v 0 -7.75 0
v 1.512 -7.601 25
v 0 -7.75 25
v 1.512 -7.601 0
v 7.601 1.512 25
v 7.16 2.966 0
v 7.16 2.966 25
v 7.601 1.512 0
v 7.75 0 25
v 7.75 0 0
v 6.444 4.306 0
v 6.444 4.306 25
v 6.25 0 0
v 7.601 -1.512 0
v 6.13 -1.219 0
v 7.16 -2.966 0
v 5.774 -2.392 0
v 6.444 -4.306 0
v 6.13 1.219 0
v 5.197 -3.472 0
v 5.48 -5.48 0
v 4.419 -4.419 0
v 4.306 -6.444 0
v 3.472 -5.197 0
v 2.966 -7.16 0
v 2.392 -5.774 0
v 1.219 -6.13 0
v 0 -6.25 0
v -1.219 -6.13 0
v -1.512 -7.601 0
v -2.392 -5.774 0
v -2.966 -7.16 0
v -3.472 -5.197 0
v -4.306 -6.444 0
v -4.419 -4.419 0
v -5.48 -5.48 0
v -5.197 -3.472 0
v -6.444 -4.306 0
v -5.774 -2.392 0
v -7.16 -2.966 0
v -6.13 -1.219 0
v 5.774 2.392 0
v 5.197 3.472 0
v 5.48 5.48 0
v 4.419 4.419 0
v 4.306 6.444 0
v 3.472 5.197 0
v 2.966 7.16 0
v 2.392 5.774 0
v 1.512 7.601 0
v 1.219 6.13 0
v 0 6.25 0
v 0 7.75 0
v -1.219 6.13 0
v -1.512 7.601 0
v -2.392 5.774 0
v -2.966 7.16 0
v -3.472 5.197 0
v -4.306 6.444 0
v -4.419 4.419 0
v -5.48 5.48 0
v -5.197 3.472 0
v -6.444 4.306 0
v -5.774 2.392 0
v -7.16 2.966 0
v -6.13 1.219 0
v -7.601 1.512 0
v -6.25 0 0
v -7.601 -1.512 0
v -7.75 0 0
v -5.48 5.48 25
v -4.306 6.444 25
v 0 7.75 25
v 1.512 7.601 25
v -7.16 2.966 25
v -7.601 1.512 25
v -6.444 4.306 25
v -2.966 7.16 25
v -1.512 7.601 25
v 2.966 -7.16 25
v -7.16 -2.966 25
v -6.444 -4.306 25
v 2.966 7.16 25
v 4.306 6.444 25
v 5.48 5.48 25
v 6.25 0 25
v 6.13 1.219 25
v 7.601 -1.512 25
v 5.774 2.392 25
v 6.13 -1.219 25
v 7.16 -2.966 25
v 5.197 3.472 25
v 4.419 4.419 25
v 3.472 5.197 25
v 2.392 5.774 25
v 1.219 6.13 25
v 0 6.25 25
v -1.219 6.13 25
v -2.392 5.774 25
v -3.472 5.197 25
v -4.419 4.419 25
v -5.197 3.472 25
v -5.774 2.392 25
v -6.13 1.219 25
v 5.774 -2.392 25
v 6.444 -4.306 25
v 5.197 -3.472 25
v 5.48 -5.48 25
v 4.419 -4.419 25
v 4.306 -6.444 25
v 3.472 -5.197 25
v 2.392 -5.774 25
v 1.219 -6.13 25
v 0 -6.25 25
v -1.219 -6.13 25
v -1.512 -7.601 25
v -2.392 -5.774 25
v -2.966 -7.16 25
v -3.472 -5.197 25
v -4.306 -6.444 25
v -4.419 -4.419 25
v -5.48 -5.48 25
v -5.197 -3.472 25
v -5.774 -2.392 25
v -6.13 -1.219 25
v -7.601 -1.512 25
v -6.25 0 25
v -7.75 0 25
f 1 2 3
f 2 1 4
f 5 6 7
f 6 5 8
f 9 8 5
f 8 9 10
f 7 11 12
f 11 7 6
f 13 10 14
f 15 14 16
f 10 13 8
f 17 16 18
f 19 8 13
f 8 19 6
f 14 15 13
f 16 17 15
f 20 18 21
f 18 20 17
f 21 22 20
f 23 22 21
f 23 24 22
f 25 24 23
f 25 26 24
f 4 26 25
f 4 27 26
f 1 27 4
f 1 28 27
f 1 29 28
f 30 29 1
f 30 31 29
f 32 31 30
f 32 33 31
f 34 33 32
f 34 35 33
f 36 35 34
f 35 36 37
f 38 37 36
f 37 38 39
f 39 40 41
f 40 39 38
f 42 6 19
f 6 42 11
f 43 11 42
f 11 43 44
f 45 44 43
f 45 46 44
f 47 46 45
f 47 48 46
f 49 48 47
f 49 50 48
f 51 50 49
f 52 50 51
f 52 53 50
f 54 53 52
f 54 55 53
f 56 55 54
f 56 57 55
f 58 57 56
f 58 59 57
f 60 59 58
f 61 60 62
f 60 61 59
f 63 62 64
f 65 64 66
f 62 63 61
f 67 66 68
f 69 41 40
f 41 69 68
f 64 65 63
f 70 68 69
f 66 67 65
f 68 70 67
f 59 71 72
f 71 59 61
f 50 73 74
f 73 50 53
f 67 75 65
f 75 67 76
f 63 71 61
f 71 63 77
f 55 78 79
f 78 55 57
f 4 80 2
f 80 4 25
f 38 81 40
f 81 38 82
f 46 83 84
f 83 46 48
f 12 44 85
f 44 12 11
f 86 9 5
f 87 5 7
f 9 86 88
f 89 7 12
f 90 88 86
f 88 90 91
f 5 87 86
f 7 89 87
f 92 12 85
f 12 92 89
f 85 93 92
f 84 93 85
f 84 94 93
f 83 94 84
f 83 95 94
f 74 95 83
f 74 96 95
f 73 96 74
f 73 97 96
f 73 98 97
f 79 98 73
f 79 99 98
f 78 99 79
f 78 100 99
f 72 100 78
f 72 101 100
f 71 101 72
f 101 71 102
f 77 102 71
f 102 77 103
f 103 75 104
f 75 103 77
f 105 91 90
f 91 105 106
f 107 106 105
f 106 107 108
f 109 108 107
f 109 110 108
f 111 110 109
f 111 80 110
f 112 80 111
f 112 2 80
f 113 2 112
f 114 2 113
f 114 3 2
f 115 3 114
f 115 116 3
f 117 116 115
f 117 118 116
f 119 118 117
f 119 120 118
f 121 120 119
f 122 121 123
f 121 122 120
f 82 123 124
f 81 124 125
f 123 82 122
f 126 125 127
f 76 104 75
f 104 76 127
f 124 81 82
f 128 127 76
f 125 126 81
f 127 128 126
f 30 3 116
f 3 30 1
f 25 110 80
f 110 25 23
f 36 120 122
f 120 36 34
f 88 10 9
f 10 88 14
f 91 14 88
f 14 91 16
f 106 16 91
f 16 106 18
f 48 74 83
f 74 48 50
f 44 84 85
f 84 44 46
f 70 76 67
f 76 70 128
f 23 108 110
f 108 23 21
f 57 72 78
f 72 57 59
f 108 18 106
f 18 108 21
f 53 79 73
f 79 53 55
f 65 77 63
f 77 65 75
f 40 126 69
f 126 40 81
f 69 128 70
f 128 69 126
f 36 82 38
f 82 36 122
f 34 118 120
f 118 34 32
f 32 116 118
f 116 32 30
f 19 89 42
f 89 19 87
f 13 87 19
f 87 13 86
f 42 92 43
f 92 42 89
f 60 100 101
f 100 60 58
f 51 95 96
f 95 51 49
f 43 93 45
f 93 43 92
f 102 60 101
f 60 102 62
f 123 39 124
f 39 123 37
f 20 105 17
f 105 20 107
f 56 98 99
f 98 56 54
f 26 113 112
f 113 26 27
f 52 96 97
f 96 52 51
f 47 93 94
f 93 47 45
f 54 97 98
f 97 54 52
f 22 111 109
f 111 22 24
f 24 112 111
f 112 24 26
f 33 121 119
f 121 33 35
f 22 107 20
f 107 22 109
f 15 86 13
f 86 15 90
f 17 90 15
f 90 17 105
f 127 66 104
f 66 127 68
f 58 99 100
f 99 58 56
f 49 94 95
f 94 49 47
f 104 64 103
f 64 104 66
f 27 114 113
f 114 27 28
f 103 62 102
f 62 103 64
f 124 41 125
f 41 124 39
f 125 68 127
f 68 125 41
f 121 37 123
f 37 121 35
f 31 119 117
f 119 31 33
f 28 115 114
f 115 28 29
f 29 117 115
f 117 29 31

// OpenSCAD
$fn = 32;

// ----------------------------------------------------------------------
// Spacer sleeve: 15.5 / 12.5 x 25 mm
// ----------------------------------------------------------------------

// --- parameters (mm) ---
tube_d = 15.5;            // outside diameter
bore_d = 12.5;            // shaft bore
tube_l = 25;              // sleeve length
step_d = 15.2;            // reduced diameter
step_l = 9.25;            // length of the step

module sleeve() {
  cylinder(h = tube_l, d = tube_d);
  translate([0, 0, tube_l - step_l]) cylinder(h = step_l, d = step_d);
}

difference() {
  sleeve();
  translate([0, 0, -1]) cylinder(h = tube_l + 2, d = bore_d);
}
